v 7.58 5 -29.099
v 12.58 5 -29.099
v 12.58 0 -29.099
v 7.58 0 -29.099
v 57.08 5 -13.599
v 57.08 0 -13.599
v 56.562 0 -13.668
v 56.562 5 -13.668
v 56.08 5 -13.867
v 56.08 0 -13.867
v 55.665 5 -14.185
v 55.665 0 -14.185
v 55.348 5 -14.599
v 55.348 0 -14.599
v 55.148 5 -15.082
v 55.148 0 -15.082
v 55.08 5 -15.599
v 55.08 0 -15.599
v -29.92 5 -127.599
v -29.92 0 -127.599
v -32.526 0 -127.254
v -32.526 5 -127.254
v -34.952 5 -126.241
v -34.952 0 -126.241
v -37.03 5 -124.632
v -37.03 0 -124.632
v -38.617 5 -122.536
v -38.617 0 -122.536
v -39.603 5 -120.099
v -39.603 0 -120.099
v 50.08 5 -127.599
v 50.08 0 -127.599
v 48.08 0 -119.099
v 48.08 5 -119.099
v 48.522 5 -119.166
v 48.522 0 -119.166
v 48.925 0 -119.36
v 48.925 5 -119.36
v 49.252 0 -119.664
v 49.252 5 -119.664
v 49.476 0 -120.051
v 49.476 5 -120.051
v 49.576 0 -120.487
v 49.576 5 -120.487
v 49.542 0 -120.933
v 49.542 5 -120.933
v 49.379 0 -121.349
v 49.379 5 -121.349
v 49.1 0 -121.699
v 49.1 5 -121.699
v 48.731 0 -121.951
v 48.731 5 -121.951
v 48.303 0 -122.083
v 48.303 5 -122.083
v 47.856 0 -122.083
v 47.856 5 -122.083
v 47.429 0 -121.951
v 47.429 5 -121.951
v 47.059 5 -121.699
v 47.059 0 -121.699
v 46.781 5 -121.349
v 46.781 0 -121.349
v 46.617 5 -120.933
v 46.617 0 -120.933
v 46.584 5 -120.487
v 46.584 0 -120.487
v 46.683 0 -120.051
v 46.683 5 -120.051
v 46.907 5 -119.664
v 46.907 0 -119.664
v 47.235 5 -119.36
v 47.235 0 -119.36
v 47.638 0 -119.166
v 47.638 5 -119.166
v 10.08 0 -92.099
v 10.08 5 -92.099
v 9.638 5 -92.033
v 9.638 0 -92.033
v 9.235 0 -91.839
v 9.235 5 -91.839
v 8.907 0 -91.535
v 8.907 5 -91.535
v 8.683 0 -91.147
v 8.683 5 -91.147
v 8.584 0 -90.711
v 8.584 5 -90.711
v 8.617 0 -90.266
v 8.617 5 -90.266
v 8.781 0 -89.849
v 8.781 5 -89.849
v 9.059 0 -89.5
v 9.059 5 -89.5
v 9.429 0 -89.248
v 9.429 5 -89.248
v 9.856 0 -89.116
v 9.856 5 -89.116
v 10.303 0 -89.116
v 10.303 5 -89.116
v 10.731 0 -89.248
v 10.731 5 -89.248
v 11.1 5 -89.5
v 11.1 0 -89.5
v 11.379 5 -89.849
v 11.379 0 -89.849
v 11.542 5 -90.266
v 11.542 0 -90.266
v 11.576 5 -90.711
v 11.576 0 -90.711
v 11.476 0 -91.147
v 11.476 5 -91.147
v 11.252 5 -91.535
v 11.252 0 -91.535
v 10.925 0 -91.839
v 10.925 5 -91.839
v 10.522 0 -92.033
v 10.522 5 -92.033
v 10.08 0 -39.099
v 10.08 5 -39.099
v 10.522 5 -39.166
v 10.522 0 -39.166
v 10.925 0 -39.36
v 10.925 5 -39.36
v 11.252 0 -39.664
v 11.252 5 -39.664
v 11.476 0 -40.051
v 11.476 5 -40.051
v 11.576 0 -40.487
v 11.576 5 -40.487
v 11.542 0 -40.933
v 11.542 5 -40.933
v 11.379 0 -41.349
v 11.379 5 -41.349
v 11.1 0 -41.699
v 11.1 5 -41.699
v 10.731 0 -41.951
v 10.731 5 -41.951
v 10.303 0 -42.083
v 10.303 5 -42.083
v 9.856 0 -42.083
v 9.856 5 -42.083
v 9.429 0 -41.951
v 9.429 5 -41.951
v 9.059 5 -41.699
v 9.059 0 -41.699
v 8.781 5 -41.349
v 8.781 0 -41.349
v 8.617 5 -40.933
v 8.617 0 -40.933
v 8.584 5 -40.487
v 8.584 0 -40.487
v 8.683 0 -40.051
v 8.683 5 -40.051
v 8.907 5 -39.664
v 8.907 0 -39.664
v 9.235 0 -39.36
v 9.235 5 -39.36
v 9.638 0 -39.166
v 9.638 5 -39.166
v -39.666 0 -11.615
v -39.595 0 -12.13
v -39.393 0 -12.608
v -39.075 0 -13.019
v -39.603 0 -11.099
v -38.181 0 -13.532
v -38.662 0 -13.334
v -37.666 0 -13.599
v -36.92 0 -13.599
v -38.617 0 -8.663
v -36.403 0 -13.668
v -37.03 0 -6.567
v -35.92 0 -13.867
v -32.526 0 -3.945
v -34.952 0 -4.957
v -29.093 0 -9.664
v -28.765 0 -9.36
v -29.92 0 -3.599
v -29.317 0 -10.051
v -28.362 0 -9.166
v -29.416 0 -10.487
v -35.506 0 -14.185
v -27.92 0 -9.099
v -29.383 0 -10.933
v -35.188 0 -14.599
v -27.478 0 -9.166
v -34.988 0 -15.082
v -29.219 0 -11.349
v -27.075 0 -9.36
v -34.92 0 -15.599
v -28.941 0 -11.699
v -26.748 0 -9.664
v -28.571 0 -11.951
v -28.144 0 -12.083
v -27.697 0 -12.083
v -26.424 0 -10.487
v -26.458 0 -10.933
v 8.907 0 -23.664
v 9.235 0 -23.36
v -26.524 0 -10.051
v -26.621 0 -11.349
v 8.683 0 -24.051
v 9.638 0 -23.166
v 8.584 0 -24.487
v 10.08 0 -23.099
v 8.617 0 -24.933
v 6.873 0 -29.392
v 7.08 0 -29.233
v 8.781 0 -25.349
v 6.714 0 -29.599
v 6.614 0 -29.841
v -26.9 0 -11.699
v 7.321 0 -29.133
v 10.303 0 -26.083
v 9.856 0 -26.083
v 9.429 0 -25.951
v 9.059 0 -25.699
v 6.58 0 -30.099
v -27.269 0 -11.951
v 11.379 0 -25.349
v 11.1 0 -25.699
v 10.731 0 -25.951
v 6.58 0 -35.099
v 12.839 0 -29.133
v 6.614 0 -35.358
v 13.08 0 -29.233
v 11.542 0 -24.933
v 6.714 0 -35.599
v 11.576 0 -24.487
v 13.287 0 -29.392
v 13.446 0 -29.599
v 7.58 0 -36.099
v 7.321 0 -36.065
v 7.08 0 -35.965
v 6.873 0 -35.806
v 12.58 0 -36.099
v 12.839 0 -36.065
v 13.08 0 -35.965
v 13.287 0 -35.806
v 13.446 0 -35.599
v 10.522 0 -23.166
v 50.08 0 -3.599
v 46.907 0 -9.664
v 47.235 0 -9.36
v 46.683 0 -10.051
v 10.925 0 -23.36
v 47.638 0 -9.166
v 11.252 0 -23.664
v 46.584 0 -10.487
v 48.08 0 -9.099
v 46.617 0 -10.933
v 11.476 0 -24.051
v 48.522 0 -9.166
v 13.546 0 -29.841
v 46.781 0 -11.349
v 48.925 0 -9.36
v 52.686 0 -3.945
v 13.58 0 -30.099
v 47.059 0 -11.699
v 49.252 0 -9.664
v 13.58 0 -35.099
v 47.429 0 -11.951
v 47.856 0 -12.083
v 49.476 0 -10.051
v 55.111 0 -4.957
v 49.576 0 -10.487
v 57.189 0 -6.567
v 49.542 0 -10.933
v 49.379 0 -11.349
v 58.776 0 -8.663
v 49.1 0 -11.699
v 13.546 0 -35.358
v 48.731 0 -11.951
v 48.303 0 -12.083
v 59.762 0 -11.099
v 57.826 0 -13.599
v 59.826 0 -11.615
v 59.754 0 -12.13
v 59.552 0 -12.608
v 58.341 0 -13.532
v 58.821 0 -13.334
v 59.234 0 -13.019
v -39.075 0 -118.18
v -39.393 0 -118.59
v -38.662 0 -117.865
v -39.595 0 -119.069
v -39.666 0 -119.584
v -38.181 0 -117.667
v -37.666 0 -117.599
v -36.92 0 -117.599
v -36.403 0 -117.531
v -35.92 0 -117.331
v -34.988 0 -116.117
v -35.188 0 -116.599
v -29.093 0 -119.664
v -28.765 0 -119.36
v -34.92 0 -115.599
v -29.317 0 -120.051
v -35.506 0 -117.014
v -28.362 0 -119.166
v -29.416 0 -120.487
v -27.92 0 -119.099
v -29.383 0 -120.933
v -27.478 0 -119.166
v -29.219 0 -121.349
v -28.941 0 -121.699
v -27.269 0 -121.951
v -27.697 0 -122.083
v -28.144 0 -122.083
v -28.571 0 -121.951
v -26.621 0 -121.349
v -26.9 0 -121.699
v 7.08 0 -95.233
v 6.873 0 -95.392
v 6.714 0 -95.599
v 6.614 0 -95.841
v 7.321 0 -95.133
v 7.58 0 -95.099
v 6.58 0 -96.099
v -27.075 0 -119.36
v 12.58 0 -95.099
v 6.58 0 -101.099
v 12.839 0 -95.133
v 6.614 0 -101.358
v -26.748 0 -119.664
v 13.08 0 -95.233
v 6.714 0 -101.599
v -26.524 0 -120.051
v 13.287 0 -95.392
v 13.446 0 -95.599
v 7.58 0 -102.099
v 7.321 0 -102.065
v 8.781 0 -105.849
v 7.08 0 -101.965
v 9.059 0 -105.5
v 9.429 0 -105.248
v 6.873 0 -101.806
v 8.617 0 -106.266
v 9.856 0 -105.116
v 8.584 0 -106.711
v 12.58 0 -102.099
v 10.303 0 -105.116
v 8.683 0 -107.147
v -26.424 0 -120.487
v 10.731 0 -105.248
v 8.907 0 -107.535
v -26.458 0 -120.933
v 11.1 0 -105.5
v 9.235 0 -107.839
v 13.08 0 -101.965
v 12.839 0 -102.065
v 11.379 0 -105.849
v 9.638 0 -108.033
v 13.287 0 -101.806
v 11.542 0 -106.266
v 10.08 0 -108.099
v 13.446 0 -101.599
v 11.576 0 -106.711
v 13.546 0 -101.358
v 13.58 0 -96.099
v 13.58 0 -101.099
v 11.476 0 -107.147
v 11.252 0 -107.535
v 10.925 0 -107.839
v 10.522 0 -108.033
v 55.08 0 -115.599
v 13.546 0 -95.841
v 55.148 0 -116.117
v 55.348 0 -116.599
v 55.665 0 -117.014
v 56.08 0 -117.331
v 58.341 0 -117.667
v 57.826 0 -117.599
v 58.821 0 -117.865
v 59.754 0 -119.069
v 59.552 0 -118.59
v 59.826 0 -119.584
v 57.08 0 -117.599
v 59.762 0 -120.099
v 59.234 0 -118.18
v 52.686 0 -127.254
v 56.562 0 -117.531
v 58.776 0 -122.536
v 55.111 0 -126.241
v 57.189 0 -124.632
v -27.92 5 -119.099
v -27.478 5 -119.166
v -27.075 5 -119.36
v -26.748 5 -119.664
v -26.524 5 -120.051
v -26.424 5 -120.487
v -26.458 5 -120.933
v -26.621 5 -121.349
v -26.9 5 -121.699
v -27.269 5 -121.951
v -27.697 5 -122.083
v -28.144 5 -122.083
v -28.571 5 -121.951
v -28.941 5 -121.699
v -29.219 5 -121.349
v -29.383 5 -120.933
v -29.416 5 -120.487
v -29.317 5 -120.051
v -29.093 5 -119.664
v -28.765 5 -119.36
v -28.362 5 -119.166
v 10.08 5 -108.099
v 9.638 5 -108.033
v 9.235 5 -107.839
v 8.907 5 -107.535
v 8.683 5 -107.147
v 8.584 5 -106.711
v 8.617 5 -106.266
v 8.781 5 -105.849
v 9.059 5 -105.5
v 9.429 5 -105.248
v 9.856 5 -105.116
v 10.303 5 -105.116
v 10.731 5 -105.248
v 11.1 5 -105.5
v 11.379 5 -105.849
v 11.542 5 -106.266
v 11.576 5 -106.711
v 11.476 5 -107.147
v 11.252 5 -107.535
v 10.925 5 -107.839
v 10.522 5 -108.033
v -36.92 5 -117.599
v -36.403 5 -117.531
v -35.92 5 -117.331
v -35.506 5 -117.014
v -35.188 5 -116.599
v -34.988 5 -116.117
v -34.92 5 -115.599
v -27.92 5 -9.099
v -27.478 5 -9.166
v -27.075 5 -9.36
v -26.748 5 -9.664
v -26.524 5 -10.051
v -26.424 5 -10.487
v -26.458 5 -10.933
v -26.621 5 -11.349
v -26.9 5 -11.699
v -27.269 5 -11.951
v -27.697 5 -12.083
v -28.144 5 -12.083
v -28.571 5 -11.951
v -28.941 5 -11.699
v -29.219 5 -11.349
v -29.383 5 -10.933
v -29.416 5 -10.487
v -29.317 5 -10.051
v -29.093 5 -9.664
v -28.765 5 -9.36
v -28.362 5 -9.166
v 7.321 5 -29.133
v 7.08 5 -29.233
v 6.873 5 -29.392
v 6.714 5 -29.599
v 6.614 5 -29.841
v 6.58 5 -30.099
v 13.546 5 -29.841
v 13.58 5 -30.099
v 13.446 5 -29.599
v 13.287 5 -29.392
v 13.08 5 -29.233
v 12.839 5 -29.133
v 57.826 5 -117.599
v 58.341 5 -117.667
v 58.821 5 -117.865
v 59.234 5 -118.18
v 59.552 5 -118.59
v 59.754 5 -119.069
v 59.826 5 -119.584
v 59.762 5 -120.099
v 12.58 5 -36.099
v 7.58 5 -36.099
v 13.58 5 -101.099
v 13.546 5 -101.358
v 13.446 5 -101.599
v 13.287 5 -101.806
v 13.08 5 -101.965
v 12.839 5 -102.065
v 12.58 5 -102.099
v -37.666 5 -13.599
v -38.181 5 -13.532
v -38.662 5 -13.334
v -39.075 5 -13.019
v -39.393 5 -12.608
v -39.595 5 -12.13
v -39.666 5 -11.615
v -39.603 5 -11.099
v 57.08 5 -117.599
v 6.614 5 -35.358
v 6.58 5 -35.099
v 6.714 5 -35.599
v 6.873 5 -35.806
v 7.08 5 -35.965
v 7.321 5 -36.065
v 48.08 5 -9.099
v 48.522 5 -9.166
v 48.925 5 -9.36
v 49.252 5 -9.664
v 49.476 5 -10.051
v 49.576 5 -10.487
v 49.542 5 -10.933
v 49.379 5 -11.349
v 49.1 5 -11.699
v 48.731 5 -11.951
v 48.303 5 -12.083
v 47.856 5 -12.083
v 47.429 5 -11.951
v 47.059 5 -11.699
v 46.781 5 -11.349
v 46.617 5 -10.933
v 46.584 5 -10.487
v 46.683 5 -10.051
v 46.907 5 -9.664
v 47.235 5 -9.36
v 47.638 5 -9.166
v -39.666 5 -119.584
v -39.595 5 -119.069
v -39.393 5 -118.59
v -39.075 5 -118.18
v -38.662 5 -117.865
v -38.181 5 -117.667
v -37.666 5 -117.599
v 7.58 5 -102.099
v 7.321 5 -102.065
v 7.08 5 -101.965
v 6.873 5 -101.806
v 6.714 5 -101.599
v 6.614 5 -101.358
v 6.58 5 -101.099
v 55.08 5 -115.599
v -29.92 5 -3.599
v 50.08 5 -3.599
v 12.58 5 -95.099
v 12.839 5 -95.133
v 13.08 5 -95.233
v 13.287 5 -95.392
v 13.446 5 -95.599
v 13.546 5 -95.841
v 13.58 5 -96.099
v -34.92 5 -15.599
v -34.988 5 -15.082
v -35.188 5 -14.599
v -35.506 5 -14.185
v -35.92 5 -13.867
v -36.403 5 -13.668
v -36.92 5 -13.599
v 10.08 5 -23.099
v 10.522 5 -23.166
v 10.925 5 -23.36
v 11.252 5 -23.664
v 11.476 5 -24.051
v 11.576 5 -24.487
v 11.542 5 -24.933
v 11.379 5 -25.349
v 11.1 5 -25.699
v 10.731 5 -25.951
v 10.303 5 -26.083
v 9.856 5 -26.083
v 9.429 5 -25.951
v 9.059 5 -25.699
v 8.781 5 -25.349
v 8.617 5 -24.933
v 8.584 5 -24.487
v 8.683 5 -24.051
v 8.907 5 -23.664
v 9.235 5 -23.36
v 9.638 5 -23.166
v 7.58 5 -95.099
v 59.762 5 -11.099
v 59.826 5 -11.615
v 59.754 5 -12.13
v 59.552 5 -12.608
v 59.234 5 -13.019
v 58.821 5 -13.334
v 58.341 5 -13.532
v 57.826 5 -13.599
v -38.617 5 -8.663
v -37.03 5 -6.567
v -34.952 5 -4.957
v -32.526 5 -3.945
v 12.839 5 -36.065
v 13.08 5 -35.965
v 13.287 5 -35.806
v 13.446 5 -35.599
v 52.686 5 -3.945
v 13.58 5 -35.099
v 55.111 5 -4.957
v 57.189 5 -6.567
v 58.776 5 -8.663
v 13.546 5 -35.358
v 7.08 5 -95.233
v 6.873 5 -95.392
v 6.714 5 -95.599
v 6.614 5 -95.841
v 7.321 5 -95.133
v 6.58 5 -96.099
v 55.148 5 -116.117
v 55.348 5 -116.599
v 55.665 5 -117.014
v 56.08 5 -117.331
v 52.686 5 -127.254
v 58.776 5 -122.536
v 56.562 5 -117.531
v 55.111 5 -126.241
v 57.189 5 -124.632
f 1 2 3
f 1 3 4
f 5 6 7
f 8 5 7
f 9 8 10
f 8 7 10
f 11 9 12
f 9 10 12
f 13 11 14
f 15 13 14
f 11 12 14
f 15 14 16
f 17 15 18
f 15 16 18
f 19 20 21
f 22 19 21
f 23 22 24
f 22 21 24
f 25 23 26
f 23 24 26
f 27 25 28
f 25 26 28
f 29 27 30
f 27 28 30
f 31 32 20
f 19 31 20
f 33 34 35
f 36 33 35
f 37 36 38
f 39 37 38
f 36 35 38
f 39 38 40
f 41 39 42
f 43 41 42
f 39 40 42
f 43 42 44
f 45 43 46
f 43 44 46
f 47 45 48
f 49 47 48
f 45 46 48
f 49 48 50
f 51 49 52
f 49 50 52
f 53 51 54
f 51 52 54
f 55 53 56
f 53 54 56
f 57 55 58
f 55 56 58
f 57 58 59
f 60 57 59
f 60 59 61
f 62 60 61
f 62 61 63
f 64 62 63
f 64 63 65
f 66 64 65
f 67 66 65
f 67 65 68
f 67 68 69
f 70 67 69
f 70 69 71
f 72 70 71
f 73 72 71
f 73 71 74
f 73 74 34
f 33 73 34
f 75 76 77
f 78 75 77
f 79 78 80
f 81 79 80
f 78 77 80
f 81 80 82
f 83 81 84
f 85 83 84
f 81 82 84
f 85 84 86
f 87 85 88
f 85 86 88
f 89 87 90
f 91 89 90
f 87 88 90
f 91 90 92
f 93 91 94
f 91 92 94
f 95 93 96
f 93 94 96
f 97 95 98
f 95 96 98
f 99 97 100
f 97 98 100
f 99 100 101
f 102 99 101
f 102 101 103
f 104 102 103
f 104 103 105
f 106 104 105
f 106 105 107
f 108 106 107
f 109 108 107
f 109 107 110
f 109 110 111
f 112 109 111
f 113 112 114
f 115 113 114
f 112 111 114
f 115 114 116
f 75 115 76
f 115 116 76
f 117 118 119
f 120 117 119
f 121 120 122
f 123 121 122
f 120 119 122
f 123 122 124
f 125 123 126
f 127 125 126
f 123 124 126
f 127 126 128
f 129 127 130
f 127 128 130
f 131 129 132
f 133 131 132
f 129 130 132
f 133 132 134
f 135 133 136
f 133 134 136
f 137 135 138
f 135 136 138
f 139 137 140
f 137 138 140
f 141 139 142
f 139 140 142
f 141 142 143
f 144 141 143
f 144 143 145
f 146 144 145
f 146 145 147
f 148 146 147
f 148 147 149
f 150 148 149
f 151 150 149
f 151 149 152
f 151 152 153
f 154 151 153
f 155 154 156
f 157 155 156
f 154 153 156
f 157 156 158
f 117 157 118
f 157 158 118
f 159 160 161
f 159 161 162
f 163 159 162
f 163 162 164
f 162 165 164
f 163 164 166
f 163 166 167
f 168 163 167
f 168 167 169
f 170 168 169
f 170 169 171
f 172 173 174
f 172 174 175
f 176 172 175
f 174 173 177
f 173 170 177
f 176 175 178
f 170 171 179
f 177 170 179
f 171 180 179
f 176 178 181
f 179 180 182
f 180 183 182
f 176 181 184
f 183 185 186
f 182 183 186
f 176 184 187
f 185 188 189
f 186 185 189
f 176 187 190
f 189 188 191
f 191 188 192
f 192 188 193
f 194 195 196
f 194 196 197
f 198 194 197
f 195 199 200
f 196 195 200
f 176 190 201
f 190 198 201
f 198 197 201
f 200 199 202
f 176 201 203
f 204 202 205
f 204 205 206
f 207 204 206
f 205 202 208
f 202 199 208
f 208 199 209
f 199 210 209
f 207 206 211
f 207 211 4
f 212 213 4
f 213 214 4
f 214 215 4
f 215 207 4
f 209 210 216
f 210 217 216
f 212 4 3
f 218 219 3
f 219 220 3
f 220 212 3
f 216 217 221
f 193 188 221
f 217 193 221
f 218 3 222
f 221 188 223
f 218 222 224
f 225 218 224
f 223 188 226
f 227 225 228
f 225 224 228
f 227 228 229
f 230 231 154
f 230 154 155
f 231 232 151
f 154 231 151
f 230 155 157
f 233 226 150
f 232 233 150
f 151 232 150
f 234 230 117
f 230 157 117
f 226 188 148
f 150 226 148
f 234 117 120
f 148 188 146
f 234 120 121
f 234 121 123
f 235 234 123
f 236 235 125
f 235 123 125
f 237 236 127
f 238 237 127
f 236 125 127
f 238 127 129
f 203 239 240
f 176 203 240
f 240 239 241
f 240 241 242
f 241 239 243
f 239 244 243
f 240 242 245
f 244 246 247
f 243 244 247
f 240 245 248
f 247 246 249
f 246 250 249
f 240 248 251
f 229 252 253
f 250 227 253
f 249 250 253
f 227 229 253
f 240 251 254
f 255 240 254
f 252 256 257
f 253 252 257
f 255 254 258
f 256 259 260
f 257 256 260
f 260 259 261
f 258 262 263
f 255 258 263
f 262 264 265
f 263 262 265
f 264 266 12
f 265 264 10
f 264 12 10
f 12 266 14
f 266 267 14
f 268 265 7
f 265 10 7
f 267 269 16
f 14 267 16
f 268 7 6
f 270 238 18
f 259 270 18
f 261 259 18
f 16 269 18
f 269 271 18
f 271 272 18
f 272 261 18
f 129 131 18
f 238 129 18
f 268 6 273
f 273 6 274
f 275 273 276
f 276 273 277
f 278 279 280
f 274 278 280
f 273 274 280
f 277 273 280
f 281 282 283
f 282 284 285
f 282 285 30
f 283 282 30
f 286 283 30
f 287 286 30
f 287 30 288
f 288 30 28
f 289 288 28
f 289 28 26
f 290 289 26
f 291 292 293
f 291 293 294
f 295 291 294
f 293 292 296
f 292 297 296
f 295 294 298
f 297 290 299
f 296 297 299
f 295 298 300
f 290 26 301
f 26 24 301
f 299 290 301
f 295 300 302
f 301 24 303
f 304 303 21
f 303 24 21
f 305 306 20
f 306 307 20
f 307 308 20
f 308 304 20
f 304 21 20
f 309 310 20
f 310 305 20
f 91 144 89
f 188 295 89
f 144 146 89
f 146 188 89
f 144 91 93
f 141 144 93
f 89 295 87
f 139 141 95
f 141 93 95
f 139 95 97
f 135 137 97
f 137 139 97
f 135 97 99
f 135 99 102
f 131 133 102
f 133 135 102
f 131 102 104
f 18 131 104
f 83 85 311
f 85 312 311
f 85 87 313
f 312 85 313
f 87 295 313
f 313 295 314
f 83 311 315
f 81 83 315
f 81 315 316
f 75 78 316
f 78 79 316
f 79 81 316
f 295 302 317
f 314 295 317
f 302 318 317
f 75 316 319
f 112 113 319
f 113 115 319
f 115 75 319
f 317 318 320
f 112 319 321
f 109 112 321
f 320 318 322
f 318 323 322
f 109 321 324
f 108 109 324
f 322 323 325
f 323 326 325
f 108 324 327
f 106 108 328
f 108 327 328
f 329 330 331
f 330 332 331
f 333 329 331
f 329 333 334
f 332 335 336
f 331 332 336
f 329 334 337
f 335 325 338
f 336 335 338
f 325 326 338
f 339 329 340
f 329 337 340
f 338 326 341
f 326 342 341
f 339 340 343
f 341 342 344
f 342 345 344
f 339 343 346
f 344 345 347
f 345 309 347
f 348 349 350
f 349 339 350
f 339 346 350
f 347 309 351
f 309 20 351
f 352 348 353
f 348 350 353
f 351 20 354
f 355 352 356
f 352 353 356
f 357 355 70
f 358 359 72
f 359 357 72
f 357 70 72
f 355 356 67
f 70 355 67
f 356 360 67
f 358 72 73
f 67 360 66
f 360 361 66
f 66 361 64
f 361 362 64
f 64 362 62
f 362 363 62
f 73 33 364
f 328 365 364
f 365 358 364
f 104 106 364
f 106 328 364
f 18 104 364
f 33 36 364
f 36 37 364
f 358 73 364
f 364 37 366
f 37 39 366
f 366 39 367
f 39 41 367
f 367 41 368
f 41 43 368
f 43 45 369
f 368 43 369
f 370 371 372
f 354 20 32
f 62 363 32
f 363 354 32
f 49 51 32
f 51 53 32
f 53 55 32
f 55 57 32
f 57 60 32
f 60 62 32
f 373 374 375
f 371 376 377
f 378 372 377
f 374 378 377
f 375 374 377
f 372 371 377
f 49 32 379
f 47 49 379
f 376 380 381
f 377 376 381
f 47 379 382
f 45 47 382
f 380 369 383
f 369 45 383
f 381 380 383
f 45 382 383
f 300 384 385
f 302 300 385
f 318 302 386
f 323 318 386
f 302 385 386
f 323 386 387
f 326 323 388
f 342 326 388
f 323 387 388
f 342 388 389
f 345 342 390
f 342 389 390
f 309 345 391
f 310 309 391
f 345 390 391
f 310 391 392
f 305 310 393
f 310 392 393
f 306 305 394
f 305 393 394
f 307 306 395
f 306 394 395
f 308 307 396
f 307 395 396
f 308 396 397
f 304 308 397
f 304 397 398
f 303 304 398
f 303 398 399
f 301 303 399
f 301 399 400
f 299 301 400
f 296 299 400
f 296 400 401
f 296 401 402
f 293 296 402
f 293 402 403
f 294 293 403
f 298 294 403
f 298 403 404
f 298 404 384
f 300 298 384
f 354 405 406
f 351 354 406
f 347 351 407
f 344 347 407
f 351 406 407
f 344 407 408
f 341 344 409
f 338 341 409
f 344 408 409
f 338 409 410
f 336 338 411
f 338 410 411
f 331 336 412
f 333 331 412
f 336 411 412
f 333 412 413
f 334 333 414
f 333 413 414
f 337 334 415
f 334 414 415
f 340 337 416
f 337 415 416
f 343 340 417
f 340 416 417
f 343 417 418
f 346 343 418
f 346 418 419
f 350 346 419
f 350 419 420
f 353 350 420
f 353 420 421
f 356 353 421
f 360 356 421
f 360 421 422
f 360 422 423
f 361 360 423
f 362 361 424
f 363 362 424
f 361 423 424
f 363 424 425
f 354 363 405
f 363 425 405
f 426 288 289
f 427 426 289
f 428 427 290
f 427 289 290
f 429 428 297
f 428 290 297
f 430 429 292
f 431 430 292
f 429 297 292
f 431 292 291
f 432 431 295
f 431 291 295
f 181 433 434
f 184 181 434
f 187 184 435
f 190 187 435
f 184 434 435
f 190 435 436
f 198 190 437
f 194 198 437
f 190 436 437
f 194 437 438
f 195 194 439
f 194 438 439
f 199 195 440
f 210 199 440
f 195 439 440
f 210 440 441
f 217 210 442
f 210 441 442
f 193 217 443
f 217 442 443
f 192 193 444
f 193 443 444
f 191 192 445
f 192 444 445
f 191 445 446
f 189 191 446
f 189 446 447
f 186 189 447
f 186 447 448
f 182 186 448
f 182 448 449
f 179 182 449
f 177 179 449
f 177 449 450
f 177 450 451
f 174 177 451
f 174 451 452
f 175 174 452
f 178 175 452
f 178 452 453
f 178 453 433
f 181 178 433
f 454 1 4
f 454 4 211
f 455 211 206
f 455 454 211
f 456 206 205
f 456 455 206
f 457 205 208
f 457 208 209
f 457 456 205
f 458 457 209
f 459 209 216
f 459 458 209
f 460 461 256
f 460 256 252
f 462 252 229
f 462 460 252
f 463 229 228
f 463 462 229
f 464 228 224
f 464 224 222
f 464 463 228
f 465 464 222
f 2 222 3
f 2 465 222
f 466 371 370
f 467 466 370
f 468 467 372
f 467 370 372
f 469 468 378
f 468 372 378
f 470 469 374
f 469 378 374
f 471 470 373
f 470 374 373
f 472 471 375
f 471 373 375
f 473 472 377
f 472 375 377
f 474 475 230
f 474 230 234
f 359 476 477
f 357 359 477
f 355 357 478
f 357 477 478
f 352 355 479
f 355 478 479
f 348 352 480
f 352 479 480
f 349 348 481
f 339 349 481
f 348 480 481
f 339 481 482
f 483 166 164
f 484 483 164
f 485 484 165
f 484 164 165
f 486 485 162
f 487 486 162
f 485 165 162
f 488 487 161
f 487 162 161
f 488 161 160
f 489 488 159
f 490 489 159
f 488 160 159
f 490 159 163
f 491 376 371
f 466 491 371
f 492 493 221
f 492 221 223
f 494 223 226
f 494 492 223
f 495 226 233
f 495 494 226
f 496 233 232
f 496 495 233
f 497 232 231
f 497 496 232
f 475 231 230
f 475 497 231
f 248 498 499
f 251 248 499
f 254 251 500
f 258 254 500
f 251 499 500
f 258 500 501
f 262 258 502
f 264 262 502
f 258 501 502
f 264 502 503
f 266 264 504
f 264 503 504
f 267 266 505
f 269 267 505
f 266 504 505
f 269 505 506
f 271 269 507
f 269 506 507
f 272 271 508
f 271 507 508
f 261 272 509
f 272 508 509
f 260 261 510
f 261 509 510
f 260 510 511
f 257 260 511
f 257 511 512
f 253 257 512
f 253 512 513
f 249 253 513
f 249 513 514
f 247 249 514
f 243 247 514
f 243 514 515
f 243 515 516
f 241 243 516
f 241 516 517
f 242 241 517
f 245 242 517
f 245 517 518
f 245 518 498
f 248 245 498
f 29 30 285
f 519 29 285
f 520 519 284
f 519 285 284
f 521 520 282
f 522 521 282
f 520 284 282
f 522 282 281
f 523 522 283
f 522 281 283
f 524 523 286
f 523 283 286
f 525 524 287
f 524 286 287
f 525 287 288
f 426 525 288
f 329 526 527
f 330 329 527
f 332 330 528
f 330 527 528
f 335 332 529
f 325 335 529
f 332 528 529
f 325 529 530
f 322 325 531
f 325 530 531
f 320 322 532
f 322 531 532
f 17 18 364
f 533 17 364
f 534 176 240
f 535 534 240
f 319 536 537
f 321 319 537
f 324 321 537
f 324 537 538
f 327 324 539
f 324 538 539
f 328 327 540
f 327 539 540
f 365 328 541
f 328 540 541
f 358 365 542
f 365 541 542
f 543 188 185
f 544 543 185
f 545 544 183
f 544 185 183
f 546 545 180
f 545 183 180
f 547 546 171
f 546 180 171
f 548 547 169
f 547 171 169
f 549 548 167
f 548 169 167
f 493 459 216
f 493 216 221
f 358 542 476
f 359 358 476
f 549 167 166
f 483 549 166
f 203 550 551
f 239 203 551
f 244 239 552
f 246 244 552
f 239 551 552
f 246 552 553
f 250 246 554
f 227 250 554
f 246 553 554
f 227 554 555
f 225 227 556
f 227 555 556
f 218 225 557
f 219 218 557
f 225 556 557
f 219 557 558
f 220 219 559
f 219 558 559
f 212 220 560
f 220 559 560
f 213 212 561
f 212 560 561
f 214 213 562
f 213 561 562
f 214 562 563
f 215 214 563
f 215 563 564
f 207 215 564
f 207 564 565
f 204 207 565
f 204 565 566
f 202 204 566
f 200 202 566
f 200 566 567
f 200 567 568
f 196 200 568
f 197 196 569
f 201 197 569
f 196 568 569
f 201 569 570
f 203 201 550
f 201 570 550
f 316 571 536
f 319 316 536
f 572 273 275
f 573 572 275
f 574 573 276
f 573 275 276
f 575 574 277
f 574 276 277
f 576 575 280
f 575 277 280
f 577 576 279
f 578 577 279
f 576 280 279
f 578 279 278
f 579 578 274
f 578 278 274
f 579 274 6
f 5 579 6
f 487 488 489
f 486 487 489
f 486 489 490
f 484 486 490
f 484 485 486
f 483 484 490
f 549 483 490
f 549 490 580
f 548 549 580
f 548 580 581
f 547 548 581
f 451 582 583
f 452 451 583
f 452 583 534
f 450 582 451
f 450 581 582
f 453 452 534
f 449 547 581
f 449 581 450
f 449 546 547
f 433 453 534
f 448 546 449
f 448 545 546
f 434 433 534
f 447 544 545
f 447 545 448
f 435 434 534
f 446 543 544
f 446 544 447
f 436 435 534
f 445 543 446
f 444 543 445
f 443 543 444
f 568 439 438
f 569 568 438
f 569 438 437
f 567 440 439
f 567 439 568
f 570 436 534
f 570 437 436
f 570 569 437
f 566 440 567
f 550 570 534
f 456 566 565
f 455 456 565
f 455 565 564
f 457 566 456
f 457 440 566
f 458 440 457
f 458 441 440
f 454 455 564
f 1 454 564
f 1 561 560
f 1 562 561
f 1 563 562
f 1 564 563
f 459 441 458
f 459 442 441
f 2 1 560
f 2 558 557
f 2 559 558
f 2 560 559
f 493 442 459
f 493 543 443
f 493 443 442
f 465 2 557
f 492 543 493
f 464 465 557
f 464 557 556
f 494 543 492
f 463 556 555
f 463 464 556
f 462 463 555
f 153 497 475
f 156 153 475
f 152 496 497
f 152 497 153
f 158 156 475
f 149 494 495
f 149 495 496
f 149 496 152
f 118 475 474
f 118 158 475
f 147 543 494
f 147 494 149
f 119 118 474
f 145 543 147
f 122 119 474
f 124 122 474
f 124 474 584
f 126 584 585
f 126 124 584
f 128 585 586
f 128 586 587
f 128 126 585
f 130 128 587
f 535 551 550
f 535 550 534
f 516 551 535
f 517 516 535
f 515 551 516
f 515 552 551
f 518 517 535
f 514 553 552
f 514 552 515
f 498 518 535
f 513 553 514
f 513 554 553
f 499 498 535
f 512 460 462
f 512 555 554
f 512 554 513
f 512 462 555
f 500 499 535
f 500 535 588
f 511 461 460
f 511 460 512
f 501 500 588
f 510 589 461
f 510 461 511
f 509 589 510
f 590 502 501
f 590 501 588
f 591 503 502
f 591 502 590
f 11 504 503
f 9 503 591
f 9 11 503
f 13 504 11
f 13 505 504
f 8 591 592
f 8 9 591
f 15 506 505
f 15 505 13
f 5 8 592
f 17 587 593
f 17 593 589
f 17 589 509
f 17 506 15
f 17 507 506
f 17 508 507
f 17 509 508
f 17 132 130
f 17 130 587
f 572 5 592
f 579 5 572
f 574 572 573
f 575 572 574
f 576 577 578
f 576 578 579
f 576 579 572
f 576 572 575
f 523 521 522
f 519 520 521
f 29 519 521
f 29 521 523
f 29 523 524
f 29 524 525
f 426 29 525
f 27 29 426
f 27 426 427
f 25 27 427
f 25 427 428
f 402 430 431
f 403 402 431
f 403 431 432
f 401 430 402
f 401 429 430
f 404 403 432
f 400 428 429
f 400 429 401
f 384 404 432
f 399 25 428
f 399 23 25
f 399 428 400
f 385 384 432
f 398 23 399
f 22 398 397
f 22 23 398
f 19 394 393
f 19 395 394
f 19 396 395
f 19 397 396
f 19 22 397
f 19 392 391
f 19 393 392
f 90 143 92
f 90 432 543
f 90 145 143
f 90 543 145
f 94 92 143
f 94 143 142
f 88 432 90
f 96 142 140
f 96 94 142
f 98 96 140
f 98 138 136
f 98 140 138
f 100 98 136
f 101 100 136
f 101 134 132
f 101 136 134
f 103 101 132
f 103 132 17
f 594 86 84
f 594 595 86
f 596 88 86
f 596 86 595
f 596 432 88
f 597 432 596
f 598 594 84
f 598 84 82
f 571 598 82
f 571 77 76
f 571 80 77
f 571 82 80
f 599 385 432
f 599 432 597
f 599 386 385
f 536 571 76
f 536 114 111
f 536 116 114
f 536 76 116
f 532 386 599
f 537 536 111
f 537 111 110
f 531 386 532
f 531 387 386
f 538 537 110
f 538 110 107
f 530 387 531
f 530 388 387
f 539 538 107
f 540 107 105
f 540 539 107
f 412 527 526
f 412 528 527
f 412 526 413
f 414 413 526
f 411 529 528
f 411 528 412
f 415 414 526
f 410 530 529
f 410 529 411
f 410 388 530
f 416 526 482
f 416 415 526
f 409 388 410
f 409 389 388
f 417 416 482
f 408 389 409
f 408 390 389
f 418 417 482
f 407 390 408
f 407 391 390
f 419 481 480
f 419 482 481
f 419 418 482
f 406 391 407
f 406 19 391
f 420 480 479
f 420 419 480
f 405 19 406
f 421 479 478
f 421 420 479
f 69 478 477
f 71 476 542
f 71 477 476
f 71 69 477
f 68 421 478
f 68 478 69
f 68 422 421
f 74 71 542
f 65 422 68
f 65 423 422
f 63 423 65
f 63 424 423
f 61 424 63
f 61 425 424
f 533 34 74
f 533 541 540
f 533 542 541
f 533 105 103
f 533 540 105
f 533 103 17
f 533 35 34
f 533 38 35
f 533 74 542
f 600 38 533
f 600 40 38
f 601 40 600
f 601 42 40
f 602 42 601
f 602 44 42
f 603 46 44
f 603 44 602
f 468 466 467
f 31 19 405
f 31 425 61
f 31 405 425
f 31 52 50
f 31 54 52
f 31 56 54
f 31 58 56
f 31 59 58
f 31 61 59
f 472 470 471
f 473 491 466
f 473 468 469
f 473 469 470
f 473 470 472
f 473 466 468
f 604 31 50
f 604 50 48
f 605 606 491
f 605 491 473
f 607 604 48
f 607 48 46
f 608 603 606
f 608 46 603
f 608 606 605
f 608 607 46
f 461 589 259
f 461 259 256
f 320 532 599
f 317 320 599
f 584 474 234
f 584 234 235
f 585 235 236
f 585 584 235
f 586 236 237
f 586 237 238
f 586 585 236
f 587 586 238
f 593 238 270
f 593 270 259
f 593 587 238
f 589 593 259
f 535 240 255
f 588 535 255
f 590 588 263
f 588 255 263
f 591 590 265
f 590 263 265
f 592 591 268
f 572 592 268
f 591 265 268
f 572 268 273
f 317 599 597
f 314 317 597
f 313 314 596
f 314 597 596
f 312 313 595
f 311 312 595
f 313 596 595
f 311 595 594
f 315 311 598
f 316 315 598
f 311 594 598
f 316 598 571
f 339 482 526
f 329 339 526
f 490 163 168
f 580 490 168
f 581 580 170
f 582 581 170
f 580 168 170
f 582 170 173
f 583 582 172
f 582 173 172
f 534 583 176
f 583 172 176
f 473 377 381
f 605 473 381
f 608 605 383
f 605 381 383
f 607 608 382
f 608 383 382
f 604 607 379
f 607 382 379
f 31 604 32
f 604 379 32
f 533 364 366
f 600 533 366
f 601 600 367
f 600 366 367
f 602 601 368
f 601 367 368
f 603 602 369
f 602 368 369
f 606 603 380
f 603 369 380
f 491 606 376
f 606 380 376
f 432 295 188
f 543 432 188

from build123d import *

# Parameters (mm, degrees)
RESSALTO_EXTRUS_O1_DEPTH = 5
ESBO_O2_R                = 1.5
CORTE_EXTRUS_O1_DEPTH    = 5
ESBO_O3_R                = 1.5
CORTE_EXTRUS_O2_DEPTH    = 10


with BuildPart() as part:
    # Esboço1 → Ressalto-extrusão1 (new body)
    with BuildSketch(Plane(origin=(0, 0, 0), x_dir=(1, 0, 0), z_dir=(0, 1, 0))):
        with BuildLine():
            Line((57.825671094, 13.599370915), (57.079704402, 13.599370915))
            ThreePointArc((57.079704402, 13.599370915), (55.665490839, 14.185157352), (55.079704402, 15.599370915))
            Line((55.079704402, 15.599370915), (55.079704402, 115.599370915))
            ThreePointArc((55.079704402, 115.599370915), (55.665490839, 117.013584477), (57.079704402, 117.599370915))
            Line((57.079704402, 117.599370915), (57.825671094, 117.599370915))
            ThreePointArc((57.825671094, 117.599370915), (59.406809924, 118.374626043), (59.762162767, 120.099370915))
            ThreePointArc((59.762162767, 120.099370915), (56.203428759, 125.505065065), (50.079704402, 127.599370915))
            Line((50.079704402, 127.599370915), (-29.920295598, 127.599370915))
            ThreePointArc((-29.920295598, 127.599370915), (-36.044019955, 125.505065065), (-39.602753964, 120.099370915))
            ThreePointArc((-39.602753964, 120.099370915), (-39.247401121, 118.374626043), (-37.666262291, 117.599370915))
            Line((-37.666262291, 117.599370915), (-36.920295598, 117.599370915))
            ThreePointArc((-36.920295598, 117.599370915), (-35.506082036, 117.013584477), (-34.920295598, 115.599370915))
            Line((-34.920295598, 115.599370915), (-34.920295598, 15.599370915))
            ThreePointArc((-34.920295598, 15.599370915), (-35.506082036, 14.185157352), (-36.920295598, 13.599370915))
            Line((-36.920295598, 13.599370915), (-37.666262291, 13.599370915))
            ThreePointArc((-37.666262291, 13.599370915), (-39.247401121, 12.824115786), (-39.602753964, 11.099370915))
            ThreePointArc((-39.602753964, 11.099370915), (-36.044019955, 5.693676764), (-29.920295598, 3.599370915))
            Line((-29.920295598, 3.599370915), (50.079704402, 3.599370915))
            ThreePointArc((50.079704402, 3.599370915), (56.203428759, 5.693676764), (59.762162767, 11.099370915))
            ThreePointArc((59.762162767, 11.099370915), (59.406809924, 12.824115786), (57.825671094, 13.599370915))
        make_face()
    extrude(amount=RESSALTO_EXTRUS_O1_DEPTH)

    # Esboço2 → Corte-extrusão1 (cut)
    with BuildSketch(Plane(origin=(0, 5, 0), x_dir=(1, 0, 0), z_dir=(0, 1, 0))):
        with Locations(Location((10.079704402, 24.599370915, 0), (0, 0, 270))):
            Circle(ESBO_O2_R)
        with Locations(Location((10.079704402, 40.599370915, 0), (0, 0, 270))):
            Circle(ESBO_O2_R)
        with Locations(Location((10.079704402, 90.599370915, 0), (0, 0, 90))):
            Circle(ESBO_O2_R)
        with Locations(Location((10.079704402, 106.599370915, 0), (0, 0, 90))):
            Circle(ESBO_O2_R)
        with BuildLine():
            Line((13.579704402, 96.099370915), (13.579704402, 101.099370915))
            ThreePointArc((13.579704402, 101.099370915), (13.286811183, 101.806477696), (12.579704402, 102.099370915))
            Line((12.579704402, 102.099370915), (7.579704402, 102.099370915))
            ThreePointArc((7.579704402, 102.099370915), (6.872597621, 101.806477696), (6.579704402, 101.099370915))
            Line((6.579704402, 101.099370915), (6.579704402, 96.099370915))
            ThreePointArc((6.579704402, 96.099370915), (6.872597621, 95.392264133), (7.579704402, 95.099370915))
            Line((7.579704402, 95.099370915), (12.579704402, 95.099370915))
            ThreePointArc((12.579704402, 95.099370915), (13.286811183, 95.392264133), (13.579704402, 96.099370915))
        make_face()
        with BuildLine():
            Line((7.579704402, 36.099370915), (12.579704402, 36.099370915))
            ThreePointArc((12.579704402, 36.099370915), (13.286811183, 35.806477696), (13.579704402, 35.099370915))
            Line((13.579704402, 35.099370915), (13.579704402, 30.099370915))
            ThreePointArc((13.579704402, 30.099370915), (13.286811183, 29.392264133), (12.579704402, 29.099370915))
            Line((12.579704402, 29.099370915), (7.579704402, 29.099370915))
            ThreePointArc((7.579704402, 29.099370915), (6.872597621, 29.392264133), (6.579704402, 30.099370915))
            Line((6.579704402, 30.099370915), (6.579704402, 35.099370915))
            ThreePointArc((6.579704402, 35.099370915), (6.872597621, 35.806477696), (7.579704402, 36.099370915))
        make_face()
    extrude(amount=-CORTE_EXTRUS_O1_DEPTH, mode=Mode.SUBTRACT)

    # Esboço3 → Corte-extrusão2 (cut)
    with BuildSketch(Plane(origin=(0, 5, 0), x_dir=(1, 0, 0), z_dir=(0, 1, 0))):
        with Locations(Location((-27.920295598, 10.599370915, 0), (0, 0, 270))):
            Circle(ESBO_O3_R)
        with Locations(Location((48.079704402, 10.599370915, 0), (0, 0, 270))):
            Circle(ESBO_O3_R)
        with Locations(Location((-27.920295598, 120.599370915, 0), (0, 0, 270))):
            Circle(ESBO_O3_R)
        with Locations(Location((48.079704402, 120.599370915, 0), (0, 0, 270))):
            Circle(ESBO_O3_R)
    extrude(amount=-CORTE_EXTRUS_O2_DEPTH, mode=Mode.SUBTRACT)


solid = part.part
